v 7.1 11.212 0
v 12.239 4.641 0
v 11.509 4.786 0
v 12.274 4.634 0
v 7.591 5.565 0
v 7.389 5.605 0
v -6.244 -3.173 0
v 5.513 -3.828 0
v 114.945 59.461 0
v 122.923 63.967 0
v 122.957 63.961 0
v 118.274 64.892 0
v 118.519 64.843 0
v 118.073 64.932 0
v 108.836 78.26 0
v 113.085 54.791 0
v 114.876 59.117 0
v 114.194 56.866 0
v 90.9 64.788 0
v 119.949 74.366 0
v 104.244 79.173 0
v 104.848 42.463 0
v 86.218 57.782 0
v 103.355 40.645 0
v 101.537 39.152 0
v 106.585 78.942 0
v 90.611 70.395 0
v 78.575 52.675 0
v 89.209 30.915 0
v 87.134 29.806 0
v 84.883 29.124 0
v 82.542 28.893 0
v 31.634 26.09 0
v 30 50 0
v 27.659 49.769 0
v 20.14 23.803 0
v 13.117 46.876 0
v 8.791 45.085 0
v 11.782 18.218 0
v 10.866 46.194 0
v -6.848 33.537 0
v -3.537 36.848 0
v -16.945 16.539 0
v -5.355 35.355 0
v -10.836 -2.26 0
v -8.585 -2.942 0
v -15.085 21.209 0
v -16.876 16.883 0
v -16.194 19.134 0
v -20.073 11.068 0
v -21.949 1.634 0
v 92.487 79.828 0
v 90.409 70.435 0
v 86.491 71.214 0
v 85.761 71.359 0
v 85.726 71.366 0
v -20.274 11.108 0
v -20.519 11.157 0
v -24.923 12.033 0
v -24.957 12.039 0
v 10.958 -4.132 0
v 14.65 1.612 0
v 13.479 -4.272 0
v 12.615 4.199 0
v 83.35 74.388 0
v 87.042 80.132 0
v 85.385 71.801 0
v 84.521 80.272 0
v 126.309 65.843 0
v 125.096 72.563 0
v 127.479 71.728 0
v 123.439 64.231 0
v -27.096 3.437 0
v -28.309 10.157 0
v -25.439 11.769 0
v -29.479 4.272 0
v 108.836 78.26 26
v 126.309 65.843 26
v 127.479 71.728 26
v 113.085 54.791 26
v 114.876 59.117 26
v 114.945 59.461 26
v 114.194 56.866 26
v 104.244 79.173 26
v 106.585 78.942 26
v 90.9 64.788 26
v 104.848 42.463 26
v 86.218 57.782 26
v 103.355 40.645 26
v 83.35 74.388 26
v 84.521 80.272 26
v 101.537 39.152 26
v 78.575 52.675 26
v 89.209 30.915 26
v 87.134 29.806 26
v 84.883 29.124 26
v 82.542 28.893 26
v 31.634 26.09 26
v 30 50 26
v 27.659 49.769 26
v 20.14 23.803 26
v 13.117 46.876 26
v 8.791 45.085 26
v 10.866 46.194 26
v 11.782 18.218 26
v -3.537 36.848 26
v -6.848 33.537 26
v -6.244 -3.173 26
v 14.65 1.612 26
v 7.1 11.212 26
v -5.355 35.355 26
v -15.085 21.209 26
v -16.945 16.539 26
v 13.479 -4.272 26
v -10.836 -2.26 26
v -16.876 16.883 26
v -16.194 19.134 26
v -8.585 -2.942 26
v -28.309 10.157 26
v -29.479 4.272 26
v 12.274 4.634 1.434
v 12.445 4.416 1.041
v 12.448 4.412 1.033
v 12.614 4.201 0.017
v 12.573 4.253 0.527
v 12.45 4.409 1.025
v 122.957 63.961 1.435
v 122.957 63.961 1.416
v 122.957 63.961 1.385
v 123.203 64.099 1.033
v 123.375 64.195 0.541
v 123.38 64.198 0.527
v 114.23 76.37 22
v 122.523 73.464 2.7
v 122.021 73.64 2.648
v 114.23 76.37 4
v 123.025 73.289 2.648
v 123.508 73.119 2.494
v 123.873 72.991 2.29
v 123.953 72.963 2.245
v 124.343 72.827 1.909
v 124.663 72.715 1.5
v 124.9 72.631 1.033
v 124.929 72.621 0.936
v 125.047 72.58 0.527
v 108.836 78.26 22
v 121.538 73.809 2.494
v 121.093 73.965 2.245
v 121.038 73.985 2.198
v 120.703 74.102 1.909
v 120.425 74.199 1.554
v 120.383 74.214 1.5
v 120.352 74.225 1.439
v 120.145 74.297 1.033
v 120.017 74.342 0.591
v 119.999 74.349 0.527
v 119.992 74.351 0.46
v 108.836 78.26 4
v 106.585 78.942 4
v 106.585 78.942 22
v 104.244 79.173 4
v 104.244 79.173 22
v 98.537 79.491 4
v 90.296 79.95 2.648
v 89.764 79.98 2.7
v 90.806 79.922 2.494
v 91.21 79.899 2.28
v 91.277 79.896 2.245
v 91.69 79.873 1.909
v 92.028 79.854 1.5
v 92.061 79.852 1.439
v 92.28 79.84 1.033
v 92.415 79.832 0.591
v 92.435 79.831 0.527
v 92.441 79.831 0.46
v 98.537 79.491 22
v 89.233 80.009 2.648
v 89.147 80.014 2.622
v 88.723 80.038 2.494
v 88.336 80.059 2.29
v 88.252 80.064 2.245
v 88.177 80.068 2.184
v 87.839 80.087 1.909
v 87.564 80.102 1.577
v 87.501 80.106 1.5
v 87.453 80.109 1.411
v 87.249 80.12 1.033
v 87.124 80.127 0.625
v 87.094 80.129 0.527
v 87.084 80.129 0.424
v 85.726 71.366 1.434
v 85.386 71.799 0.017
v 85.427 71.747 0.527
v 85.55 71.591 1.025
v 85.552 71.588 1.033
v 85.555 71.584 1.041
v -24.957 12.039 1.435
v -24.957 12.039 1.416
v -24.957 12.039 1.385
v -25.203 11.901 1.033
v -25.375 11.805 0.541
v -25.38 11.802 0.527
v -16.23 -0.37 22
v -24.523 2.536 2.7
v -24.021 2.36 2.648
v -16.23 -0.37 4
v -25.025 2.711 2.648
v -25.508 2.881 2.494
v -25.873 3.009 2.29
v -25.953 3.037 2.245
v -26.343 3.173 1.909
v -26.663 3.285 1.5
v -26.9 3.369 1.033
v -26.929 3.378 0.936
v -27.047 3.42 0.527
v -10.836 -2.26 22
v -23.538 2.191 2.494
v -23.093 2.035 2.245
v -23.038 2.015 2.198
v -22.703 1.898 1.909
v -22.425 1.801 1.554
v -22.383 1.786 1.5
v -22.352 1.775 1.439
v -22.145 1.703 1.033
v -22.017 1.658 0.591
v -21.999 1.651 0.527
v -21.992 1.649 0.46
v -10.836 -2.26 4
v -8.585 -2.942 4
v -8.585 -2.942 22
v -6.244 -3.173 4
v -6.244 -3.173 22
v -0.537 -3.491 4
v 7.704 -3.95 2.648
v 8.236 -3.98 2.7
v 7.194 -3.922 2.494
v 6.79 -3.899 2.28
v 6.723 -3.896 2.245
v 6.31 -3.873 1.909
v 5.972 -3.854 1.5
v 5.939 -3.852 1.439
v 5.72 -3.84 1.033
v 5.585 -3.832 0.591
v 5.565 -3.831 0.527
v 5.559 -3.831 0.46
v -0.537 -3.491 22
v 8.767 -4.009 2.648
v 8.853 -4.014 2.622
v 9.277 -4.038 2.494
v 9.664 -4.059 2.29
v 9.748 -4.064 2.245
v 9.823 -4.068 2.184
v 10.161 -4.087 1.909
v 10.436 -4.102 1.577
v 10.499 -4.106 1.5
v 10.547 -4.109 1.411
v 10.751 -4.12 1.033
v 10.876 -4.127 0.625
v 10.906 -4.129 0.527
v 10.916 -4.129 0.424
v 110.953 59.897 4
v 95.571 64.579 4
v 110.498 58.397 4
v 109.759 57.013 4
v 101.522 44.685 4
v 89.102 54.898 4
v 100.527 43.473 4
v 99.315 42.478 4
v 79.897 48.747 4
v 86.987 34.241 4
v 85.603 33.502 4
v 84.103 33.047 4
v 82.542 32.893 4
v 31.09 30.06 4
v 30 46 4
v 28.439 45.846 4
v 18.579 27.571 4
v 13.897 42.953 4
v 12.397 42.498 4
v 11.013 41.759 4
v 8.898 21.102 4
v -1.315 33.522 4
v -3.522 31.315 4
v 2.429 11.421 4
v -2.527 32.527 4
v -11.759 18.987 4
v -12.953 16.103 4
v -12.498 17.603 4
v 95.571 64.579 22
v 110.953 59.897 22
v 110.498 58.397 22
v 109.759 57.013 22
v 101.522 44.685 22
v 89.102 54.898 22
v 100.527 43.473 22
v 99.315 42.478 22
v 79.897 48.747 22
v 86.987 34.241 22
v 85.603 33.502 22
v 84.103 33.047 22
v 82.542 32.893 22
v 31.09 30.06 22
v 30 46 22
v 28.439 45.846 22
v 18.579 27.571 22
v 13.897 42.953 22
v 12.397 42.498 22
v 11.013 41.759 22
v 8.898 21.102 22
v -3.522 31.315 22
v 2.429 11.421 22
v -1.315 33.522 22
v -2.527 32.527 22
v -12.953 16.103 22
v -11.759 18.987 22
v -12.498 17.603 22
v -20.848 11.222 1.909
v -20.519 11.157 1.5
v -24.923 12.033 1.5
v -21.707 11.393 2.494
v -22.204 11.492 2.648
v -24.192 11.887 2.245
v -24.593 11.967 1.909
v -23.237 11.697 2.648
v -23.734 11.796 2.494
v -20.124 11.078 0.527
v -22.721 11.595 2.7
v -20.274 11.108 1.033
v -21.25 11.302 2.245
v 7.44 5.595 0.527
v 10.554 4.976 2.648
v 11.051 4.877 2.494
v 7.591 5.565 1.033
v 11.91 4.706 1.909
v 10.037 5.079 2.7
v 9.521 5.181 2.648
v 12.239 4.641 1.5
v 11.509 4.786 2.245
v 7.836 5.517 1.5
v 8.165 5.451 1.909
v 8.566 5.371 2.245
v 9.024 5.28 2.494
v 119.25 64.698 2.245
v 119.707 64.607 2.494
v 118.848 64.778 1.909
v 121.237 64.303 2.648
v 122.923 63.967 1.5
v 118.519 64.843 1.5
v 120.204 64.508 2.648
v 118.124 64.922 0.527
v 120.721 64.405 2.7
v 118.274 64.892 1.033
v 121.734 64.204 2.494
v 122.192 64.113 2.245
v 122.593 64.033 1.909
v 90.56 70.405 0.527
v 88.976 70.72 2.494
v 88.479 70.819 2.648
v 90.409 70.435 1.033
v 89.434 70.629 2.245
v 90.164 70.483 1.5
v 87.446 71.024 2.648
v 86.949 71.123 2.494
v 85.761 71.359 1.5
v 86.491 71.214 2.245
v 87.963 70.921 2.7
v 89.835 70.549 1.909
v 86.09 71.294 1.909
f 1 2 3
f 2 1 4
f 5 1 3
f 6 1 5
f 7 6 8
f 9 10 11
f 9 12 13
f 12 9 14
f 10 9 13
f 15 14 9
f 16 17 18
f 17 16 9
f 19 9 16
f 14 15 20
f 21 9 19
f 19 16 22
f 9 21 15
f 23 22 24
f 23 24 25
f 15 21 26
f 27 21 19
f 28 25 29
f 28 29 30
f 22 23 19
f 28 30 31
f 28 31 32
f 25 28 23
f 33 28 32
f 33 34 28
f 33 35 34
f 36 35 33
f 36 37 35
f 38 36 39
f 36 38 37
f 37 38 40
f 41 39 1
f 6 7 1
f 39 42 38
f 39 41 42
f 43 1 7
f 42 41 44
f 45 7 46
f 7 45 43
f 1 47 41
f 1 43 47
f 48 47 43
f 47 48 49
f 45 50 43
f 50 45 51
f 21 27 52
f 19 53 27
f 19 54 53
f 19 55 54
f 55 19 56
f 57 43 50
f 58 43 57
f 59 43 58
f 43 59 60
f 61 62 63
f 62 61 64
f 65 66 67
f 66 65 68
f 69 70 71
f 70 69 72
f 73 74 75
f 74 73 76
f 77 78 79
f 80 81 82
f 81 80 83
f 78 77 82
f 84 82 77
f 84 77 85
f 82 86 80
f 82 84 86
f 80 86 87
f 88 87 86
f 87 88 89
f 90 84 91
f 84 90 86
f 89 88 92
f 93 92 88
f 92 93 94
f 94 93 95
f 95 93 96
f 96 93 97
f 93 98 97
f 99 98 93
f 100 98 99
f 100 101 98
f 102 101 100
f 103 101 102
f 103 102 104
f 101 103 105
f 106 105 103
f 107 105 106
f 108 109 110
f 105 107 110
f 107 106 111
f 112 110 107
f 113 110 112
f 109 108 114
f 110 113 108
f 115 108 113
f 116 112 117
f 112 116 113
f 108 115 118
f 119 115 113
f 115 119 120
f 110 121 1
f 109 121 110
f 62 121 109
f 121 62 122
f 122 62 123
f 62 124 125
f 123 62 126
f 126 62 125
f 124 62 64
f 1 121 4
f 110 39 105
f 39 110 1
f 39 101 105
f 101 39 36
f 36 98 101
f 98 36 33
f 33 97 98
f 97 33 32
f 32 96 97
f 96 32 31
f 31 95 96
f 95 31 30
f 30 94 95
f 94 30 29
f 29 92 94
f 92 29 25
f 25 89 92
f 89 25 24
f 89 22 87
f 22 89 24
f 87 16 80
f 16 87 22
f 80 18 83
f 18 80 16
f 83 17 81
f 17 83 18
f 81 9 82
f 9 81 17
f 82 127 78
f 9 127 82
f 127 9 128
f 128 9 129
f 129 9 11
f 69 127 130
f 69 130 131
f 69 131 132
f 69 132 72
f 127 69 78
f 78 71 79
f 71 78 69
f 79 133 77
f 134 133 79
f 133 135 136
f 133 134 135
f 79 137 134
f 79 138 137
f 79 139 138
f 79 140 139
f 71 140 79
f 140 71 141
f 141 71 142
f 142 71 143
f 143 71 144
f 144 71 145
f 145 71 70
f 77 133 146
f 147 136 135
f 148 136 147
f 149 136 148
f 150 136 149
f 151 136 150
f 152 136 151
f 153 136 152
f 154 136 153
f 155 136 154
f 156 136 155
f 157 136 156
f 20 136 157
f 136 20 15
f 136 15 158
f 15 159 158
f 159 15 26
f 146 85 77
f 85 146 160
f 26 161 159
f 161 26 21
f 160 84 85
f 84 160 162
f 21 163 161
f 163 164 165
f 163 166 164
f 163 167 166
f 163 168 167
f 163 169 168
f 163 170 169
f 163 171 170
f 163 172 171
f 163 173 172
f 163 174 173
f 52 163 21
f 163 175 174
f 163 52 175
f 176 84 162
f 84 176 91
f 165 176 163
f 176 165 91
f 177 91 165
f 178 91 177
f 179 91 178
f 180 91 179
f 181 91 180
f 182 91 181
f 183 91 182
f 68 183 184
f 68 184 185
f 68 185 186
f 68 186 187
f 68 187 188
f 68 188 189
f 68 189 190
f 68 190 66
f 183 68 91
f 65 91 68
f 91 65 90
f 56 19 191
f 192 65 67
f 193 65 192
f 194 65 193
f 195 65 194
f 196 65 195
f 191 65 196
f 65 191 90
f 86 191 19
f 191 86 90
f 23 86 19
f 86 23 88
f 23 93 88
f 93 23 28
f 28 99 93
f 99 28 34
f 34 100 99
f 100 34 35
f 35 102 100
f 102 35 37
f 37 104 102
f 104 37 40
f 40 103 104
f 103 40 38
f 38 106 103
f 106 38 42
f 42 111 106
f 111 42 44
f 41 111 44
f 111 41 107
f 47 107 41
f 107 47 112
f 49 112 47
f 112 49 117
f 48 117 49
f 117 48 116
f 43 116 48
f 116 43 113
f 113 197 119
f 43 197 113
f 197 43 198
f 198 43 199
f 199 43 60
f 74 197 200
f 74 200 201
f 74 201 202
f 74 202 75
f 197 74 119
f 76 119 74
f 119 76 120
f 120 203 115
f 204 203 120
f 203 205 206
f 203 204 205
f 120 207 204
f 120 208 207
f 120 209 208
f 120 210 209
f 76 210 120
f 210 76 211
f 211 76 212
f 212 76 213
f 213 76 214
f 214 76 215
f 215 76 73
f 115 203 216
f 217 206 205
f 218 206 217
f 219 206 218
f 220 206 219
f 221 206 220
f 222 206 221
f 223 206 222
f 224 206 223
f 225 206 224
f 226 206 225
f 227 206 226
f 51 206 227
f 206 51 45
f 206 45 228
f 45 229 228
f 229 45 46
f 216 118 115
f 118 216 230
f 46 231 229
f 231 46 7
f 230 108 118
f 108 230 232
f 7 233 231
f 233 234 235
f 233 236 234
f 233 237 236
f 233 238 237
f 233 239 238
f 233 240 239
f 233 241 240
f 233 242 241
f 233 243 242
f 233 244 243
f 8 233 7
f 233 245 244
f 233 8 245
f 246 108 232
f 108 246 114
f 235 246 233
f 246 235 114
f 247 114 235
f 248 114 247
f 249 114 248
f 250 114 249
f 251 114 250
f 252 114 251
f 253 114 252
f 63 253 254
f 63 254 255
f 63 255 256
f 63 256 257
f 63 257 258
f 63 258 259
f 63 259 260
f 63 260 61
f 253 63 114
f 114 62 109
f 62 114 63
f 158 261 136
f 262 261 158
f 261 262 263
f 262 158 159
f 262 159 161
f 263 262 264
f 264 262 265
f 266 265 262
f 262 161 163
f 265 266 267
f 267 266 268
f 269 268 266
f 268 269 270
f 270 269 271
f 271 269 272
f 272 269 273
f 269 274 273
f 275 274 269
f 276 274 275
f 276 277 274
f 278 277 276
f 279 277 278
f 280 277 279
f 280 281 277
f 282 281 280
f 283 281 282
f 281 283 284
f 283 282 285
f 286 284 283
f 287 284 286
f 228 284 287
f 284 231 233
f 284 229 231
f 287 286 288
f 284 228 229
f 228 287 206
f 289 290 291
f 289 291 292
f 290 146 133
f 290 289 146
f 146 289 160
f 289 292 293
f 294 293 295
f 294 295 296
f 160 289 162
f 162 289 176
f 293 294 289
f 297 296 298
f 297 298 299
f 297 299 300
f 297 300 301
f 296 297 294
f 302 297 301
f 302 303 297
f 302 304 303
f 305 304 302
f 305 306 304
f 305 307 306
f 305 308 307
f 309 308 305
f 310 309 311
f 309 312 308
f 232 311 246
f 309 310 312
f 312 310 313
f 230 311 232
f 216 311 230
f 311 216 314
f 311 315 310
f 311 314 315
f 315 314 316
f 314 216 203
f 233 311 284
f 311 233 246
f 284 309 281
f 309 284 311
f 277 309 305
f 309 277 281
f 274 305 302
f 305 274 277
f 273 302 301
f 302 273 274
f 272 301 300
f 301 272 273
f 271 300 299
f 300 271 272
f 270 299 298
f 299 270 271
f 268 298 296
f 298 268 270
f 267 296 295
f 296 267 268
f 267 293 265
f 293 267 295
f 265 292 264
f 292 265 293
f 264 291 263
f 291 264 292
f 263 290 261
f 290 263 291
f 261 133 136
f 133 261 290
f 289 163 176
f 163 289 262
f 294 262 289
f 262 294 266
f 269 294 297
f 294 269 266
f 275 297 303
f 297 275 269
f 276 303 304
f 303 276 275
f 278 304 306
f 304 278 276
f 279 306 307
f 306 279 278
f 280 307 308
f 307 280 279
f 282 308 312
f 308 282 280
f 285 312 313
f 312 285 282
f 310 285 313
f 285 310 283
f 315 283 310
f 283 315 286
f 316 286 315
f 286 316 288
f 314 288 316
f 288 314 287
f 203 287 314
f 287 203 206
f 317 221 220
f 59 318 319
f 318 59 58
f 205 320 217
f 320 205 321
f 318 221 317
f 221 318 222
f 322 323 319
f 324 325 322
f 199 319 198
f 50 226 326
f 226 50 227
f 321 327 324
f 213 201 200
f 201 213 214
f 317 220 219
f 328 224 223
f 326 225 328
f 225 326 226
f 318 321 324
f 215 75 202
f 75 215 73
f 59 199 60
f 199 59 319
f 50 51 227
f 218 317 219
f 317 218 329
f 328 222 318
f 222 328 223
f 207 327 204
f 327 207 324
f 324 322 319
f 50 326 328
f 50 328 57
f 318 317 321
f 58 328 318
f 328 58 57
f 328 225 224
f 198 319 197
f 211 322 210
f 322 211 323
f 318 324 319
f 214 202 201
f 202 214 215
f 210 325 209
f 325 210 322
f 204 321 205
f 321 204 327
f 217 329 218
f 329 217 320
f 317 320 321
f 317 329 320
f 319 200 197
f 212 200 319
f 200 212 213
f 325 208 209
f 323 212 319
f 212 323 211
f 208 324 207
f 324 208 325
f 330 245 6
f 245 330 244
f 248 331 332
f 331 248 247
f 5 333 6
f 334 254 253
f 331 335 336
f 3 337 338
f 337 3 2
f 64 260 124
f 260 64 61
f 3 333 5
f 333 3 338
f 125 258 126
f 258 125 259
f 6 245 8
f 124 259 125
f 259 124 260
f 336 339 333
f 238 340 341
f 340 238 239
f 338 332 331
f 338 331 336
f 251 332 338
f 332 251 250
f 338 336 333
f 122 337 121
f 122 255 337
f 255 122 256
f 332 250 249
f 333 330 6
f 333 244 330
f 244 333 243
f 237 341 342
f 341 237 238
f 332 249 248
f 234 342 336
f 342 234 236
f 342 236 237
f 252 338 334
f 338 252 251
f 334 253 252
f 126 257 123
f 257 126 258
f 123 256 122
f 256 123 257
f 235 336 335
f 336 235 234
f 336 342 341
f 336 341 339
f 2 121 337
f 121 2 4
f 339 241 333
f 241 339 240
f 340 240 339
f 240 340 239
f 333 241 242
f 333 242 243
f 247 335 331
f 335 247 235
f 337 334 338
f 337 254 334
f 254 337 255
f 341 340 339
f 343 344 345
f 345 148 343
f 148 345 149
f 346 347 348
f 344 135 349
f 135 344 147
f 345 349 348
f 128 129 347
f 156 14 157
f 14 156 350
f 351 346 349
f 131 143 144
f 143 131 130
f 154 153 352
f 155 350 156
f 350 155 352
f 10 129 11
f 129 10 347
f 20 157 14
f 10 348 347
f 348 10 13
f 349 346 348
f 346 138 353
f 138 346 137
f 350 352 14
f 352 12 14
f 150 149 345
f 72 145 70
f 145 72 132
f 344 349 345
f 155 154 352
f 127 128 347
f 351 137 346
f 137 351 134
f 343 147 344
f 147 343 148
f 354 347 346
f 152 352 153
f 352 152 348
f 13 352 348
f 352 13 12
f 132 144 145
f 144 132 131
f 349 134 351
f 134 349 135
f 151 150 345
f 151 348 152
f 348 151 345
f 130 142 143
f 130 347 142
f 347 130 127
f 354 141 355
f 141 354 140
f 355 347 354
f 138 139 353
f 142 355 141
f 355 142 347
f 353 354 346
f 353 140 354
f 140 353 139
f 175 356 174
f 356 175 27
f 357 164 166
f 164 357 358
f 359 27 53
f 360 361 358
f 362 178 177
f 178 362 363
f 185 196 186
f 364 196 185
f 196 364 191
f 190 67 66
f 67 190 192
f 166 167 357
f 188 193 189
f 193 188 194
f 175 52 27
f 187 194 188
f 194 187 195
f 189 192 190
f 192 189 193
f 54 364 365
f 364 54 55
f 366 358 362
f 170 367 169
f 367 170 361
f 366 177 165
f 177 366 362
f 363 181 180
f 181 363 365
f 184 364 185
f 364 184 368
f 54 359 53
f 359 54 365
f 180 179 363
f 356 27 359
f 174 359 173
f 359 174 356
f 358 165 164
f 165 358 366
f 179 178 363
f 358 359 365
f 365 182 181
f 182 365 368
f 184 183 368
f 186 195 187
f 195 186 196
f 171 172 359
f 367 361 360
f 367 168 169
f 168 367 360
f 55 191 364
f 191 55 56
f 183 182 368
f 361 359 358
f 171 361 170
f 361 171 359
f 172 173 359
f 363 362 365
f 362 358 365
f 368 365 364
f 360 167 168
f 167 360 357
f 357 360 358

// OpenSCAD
$fn = 32;

// ----------------------------------------------------------------------
// Air duct: 24 mm duct, 4 mm wall, 26 mm across
// ----------------------------------------------------------------------

// --- parameters (mm) ---
duct_r = 12;              // duct core radius
duct_d = 24;              // duct core diameter
wall = 4;                 // duct wall thickness
height = 26;              // duct width (extrusion height)
port_r = 21.9;            // port flange half width
port_d = 43.8;            // port flange width
port_t = 6;               // port flange thickness
bolt_d = 5.4;             // port bolt holes
bolt_offset = 16.7;       // bolt hole offset from the port axis

difference() {
  /* outer hull chain: tube with a flat flange plate at every port */
  linear_extrude(height = 26) {
    hull() {
      polygon([[13.479, -4.272], [-29.479, 4.272], [-28.309, 10.157], [14.65, 1.612]]);
      translate([-6.244, 8.827]) circle(r = 12);
    }
    hull() {
      translate([-6.244, 8.827]) circle(r = 12);
      translate([-5.107, 14.542]) circle(r = 12);
    }
    hull() {
      translate([-5.107, 14.542]) circle(r = 12);
      translate([3.13, 26.87]) circle(r = 12);
    }
    hull() {
      translate([3.13, 26.87]) circle(r = 12);
      translate([15.458, 35.107]) circle(r = 12);
    }
    hull() {
      translate([15.458, 35.107]) circle(r = 12);
      translate([30, 38]) circle(r = 12);
    }
    hull() {
      translate([30, 38]) circle(r = 12);
      translate([82.542, 40.893]) circle(r = 12);
    }
    hull() {
      translate([82.542, 40.893]) circle(r = 12);
      translate([94.87, 49.13]) circle(r = 12);
    }
    hull() {
      translate([94.87, 49.13]) circle(r = 12);
      translate([103.107, 61.458]) circle(r = 12);
    }
    hull() {
      translate([103.107, 61.458]) circle(r = 12);
      translate([104.244, 67.173]) circle(r = 12);
    }
    hull() {
      translate([104.244, 67.173]) circle(r = 12);
      polygon([[84.521, 80.272], [127.479, 71.728], [126.309, 65.843], [83.35, 74.388]]);
    }
  }
  /* air passage: the same chain inset by the wall, 5 mm proud of the ports */
  translate([0, 0, 4]) linear_extrude(height = 18) {
    hull() {
      translate([-8.975, -4.904]) circle(r = 8);
      translate([-5.107, 14.542]) circle(r = 8);
    }
    hull() {
      translate([-5.107, 14.542]) circle(r = 8);
      translate([3.13, 26.87]) circle(r = 8);
    }
    hull() {
      translate([3.13, 26.87]) circle(r = 8);
      translate([15.458, 35.107]) circle(r = 8);
    }
    hull() {
      translate([15.458, 35.107]) circle(r = 8);
      translate([30, 38]) circle(r = 8);
    }
    hull() {
      translate([30, 38]) circle(r = 8);
      translate([82.542, 40.893]) circle(r = 8);
    }
    hull() {
      translate([82.542, 40.893]) circle(r = 8);
      translate([94.87, 49.13]) circle(r = 8);
    }
    hull() {
      translate([94.87, 49.13]) circle(r = 8);
      translate([103.107, 61.458]) circle(r = 8);
    }
    hull() {
      translate([103.107, 61.458]) circle(r = 8);
      translate([106.975, 80.904]) circle(r = 8);
    }
  }
  translate([-8, 0]) rotate([0, 0, -11.25]) translate([-16.7, -2.5]) rotate([-90, 0, 0]) cylinder(h = 11, d = 5.4);
  translate([-8, 0]) rotate([0, 0, -11.25]) translate([16.7, -2.5]) rotate([-90, 0, 0]) cylinder(h = 11, d = 5.4);
  translate([106, 76]) rotate([0, 0, 168.75]) translate([-16.7, -2.5]) rotate([-90, 0, 0]) cylinder(h = 11, d = 5.4);
  translate([106, 76]) rotate([0, 0, 168.75]) translate([16.7, -2.5]) rotate([-90, 0, 0]) cylinder(h = 11, d = 5.4);
}
